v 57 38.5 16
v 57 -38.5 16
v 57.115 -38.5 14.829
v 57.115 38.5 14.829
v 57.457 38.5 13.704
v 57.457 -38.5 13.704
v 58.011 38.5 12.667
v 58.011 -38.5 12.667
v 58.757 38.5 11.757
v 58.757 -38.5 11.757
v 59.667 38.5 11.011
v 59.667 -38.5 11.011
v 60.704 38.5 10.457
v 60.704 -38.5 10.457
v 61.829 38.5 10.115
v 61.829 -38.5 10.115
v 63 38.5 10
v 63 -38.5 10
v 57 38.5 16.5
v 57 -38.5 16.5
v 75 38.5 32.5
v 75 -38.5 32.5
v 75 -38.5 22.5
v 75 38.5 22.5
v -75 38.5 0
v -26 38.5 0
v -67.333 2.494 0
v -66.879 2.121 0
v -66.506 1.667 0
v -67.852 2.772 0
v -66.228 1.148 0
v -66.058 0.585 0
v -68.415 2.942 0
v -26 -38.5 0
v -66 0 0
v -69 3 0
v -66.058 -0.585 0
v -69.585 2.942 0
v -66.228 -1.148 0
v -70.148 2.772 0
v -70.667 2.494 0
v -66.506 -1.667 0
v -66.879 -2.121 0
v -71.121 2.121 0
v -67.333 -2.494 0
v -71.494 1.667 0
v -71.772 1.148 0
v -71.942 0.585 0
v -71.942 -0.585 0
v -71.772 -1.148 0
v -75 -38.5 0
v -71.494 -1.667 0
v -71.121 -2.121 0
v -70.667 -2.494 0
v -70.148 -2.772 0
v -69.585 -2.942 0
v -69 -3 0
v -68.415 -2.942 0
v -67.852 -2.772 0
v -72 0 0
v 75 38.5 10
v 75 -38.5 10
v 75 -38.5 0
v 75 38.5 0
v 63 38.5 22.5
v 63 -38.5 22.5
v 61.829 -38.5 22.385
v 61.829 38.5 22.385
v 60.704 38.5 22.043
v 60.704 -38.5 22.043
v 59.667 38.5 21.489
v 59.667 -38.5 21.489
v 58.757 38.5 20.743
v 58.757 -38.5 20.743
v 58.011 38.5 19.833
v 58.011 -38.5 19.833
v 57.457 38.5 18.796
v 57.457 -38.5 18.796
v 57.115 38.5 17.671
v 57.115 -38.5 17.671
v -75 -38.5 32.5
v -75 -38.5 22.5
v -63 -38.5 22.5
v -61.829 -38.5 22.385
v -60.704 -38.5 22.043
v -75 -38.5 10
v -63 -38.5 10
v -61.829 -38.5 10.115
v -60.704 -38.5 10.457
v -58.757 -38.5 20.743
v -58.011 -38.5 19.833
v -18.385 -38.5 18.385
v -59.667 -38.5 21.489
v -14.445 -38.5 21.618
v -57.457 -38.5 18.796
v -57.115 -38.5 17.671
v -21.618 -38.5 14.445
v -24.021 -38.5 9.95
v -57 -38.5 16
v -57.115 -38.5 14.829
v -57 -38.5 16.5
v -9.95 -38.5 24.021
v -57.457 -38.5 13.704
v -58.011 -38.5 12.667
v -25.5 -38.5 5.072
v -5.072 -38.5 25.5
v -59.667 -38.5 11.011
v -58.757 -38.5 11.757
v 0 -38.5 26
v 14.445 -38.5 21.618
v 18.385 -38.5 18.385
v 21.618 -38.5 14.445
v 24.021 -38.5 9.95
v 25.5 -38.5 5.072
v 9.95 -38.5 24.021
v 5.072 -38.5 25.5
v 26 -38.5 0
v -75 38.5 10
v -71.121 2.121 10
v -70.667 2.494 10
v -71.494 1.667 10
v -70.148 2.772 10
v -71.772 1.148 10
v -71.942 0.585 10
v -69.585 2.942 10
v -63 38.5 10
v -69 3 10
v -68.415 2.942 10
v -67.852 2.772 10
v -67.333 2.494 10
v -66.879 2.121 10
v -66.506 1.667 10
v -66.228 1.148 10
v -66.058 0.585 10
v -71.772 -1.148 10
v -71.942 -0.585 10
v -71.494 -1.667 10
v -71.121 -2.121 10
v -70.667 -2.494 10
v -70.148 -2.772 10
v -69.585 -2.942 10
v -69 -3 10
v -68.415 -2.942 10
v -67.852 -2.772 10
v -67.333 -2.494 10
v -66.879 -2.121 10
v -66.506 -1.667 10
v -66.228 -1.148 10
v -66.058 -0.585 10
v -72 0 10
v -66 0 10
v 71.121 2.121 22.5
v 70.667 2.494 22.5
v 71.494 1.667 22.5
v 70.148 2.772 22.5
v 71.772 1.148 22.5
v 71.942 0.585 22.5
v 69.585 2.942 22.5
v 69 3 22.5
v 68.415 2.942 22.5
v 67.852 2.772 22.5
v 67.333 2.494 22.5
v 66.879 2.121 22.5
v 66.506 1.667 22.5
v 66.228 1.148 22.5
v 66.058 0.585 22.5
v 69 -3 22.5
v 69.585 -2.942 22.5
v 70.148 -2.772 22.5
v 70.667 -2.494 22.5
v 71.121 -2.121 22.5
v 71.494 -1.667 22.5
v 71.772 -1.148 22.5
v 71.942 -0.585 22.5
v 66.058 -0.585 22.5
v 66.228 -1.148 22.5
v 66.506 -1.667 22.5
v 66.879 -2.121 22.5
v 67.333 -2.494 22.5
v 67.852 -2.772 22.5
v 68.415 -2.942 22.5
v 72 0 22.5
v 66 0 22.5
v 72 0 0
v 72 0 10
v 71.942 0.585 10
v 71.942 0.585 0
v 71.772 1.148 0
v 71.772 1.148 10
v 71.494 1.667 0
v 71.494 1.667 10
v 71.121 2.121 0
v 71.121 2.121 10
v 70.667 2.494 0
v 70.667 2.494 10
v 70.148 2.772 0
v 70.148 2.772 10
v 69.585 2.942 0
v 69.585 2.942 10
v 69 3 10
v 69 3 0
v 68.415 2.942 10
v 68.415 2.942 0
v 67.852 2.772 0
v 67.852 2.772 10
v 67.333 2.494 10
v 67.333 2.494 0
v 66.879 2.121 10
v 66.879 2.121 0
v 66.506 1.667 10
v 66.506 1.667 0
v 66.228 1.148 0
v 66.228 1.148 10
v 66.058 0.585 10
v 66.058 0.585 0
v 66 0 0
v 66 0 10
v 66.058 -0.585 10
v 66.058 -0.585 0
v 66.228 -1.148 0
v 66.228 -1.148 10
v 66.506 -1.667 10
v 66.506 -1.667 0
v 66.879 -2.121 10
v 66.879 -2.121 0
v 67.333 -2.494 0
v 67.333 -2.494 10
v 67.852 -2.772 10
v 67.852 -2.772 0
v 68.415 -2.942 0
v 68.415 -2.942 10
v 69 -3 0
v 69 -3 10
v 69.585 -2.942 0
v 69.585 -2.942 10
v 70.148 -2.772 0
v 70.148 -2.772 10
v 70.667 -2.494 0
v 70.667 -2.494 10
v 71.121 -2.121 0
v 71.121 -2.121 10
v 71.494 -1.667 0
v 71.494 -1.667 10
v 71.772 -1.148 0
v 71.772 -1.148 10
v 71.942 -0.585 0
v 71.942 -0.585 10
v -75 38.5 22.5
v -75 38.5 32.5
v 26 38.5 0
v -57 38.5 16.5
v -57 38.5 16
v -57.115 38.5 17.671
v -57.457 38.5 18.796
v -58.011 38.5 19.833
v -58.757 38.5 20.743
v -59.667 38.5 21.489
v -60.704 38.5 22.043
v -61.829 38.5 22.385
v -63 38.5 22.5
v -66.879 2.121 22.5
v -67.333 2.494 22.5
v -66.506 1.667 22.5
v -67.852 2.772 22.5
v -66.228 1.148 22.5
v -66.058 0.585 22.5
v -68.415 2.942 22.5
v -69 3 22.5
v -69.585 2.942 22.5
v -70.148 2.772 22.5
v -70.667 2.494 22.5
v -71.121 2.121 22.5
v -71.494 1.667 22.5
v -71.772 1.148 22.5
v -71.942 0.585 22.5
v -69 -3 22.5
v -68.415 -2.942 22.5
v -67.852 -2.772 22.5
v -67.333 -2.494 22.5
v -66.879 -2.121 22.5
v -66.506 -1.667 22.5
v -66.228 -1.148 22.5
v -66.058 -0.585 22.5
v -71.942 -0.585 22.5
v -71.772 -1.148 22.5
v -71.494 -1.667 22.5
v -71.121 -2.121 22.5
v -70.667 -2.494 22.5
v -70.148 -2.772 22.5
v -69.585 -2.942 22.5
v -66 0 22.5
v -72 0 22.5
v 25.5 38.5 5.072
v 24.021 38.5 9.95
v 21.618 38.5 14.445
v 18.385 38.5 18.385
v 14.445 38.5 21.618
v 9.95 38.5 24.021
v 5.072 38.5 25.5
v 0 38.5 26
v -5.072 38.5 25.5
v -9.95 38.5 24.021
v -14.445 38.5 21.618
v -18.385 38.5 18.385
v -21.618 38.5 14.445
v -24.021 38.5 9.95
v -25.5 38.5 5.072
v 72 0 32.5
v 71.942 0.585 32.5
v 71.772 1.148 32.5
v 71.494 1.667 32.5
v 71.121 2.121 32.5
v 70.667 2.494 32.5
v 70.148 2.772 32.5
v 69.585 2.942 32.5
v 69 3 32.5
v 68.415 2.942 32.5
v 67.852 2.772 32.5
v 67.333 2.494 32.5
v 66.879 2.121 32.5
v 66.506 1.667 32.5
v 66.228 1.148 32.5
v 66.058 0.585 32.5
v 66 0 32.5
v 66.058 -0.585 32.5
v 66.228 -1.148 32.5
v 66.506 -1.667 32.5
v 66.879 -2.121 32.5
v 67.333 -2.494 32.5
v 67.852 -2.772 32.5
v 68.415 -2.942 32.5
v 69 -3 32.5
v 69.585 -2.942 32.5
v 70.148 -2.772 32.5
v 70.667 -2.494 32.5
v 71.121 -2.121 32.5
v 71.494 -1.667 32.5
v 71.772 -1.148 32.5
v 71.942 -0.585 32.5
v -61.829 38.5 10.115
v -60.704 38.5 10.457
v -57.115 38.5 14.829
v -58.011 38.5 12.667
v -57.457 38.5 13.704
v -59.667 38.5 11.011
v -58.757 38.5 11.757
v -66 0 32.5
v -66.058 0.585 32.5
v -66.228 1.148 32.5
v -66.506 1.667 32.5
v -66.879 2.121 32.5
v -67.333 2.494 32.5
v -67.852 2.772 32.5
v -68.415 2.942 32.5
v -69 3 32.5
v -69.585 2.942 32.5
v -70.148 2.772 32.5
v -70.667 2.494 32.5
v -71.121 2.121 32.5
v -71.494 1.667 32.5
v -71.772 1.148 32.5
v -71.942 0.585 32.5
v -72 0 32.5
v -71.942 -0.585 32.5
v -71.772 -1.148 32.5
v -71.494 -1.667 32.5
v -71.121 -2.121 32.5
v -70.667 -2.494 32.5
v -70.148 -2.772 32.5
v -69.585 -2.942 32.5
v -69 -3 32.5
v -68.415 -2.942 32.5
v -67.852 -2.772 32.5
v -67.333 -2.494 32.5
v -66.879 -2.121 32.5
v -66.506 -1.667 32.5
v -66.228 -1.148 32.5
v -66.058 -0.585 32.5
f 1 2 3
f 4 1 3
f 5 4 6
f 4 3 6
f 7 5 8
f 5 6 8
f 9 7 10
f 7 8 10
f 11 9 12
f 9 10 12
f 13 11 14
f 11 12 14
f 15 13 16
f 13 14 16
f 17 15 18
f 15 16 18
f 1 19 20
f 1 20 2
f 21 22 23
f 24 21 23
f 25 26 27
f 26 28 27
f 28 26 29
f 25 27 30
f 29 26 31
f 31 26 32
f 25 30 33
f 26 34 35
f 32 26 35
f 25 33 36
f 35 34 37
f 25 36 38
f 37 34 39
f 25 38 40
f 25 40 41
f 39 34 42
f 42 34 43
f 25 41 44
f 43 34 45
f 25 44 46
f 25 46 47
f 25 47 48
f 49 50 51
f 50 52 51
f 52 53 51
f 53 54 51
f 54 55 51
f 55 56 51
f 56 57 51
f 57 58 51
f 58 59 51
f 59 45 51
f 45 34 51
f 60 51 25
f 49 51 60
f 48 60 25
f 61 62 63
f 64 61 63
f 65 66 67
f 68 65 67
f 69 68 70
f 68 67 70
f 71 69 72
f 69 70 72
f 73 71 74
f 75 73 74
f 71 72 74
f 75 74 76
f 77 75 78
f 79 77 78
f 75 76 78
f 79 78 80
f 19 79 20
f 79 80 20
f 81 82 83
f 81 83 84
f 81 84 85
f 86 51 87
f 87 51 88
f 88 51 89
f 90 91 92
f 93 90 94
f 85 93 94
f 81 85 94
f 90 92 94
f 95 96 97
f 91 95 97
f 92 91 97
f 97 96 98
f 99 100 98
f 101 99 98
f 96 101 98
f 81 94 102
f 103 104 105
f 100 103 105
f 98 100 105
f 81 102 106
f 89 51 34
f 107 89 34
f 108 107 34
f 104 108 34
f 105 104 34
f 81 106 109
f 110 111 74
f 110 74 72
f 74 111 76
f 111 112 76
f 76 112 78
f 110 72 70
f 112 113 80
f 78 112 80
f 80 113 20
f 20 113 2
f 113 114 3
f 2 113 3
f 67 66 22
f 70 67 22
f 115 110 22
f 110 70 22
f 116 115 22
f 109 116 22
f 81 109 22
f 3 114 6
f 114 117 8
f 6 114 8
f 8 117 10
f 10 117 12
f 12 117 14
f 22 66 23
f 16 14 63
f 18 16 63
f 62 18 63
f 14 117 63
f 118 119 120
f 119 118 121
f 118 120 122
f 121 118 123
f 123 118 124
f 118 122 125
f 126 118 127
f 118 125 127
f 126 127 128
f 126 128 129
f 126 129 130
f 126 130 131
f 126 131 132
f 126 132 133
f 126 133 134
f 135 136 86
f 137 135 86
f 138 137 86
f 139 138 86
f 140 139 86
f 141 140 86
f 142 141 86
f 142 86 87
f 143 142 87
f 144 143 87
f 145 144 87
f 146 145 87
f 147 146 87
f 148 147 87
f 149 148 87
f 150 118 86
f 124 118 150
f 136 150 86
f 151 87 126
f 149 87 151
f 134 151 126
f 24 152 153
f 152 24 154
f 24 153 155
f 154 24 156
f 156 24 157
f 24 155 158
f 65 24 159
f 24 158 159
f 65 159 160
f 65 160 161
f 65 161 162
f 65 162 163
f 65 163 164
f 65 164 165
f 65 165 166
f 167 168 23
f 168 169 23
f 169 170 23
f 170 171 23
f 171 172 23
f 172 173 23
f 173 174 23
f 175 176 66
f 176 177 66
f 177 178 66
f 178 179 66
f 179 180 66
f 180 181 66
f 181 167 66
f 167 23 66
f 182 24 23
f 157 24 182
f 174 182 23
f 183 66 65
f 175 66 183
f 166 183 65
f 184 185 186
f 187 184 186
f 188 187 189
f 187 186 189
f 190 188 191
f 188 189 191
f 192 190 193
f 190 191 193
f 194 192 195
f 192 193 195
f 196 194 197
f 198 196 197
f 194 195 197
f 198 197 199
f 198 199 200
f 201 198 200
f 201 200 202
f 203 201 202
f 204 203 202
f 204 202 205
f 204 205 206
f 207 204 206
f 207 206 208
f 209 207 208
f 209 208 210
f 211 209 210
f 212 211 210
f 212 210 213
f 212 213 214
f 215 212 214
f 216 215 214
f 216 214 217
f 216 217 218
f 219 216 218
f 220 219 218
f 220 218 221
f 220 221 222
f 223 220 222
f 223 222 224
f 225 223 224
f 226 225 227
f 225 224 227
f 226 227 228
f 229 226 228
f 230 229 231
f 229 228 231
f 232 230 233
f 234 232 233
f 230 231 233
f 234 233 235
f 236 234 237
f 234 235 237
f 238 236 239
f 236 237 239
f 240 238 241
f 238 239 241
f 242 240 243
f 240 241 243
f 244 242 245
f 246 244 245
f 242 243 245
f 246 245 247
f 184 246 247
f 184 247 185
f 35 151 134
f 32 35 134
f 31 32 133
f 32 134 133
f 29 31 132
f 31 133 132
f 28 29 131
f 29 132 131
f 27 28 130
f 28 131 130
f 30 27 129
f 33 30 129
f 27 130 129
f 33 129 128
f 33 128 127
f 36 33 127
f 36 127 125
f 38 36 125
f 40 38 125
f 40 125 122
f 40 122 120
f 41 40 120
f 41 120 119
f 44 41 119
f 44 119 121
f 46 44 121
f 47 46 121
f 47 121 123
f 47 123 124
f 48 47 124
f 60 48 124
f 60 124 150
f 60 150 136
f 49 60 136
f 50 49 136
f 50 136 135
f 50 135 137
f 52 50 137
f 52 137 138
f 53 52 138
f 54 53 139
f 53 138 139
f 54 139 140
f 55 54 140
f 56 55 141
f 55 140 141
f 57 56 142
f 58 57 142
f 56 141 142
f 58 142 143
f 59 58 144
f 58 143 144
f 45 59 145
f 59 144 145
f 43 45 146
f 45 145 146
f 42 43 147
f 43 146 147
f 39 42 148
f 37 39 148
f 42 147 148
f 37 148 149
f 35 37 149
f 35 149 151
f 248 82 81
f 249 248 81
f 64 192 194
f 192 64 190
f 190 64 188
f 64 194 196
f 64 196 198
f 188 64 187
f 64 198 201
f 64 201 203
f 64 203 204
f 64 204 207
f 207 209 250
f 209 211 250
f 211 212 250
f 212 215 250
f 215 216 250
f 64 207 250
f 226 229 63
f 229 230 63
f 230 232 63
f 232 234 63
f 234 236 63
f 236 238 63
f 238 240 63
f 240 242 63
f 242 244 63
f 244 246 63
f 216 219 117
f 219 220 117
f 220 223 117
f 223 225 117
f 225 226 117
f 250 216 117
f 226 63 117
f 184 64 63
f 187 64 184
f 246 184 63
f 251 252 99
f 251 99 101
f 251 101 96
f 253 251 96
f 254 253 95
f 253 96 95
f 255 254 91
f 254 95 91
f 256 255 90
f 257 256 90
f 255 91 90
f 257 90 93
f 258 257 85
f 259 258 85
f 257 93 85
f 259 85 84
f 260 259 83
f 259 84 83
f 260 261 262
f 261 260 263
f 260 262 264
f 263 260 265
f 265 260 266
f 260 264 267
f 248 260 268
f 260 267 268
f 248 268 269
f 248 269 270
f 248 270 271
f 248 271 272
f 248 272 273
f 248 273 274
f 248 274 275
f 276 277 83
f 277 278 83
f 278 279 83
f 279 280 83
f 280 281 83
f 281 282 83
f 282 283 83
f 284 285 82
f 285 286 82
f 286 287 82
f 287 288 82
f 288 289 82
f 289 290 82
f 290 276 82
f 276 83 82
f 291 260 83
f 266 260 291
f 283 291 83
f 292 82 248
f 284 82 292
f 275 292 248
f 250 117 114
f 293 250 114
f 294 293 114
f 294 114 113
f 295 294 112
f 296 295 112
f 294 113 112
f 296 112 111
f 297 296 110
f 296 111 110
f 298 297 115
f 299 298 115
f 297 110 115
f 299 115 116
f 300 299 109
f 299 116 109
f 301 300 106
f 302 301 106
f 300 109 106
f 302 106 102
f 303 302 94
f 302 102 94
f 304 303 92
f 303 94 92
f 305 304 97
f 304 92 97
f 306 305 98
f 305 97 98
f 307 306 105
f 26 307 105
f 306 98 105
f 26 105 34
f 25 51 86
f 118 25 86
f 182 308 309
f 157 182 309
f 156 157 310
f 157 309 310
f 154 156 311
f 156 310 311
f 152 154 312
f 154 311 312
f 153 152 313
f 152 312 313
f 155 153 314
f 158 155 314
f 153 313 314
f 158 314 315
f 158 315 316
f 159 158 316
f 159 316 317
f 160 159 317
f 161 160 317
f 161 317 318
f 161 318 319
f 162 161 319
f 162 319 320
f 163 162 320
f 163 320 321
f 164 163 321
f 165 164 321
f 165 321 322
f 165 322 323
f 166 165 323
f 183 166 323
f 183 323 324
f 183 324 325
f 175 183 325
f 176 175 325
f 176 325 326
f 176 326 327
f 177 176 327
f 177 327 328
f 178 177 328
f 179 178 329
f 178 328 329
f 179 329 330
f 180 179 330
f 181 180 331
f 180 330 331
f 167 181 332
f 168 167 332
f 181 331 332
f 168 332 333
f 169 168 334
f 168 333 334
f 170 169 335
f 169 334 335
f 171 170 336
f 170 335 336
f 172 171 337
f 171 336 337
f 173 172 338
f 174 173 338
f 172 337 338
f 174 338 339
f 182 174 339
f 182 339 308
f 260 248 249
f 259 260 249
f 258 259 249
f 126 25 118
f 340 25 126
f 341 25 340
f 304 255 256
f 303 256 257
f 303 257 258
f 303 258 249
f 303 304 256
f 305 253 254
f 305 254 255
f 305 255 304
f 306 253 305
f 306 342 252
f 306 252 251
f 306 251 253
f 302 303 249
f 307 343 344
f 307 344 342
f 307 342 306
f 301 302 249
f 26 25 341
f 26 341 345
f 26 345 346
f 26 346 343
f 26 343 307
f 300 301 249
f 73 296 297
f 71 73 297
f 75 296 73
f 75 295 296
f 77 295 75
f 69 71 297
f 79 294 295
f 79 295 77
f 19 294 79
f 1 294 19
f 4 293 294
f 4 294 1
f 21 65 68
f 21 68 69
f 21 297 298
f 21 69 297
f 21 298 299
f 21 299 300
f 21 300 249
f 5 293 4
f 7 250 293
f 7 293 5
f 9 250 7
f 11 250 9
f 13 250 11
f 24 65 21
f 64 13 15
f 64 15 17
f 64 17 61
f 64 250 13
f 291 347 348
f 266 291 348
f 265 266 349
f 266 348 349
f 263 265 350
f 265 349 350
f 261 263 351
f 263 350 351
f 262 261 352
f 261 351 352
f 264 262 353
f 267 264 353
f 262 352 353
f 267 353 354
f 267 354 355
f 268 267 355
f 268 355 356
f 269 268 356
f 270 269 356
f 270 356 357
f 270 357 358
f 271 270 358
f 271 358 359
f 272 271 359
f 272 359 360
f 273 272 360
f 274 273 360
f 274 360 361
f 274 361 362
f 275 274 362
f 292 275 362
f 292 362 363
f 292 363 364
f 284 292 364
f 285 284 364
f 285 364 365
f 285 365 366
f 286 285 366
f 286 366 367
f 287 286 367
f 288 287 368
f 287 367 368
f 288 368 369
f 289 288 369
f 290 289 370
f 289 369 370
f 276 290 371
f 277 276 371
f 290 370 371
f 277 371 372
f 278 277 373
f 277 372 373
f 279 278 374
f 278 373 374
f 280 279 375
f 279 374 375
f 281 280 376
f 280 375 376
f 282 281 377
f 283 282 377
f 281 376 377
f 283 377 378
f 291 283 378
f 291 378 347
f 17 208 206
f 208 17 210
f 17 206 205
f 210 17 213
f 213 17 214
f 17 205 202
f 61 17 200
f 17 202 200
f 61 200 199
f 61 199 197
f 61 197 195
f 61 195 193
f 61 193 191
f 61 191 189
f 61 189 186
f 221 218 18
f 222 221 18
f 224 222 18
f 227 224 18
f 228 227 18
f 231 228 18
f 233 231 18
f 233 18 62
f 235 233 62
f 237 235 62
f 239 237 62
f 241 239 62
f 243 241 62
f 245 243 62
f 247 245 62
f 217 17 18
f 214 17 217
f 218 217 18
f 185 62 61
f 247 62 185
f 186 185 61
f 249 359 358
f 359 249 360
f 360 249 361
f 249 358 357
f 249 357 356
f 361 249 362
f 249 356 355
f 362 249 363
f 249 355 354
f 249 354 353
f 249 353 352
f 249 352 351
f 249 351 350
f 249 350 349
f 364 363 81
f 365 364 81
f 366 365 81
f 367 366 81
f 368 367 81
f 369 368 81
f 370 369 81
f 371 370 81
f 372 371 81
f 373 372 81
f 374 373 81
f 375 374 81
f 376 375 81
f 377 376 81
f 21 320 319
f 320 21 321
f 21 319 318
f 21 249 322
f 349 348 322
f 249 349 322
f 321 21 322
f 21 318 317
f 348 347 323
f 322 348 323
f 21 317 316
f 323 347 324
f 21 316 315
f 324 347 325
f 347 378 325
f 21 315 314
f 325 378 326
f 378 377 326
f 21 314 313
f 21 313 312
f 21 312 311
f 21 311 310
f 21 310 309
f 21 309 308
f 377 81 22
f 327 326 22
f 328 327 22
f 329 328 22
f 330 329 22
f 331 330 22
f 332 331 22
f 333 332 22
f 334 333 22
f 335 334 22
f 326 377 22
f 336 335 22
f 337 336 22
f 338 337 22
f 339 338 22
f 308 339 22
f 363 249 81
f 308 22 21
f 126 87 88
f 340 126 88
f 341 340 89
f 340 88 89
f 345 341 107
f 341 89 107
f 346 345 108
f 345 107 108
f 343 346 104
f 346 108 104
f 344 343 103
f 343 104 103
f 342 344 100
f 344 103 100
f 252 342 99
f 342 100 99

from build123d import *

# Parameters (mm, degrees)
BOSS_EXTRUDE1_DEPTH      = 38.5
BOSS_EXTRUDE1_DEPTH_BACK = 38.5
SKETCH5_R                = 3
CUT_EXTRUDE1_DEPTH       = 91.352089074


with BuildPart() as part:
    # Sketch1 → Boss-Extrude1 (new, two sides: drawn at the far end of the back side and taken through both)
    with BuildSketch(Plane(origin=(0, 0, 0), x_dir=(1, 0, 0), z_dir=(0, 1, 0)).offset(-BOSS_EXTRUDE1_DEPTH_BACK)):
        with BuildLine():
            Line((-26, 0), (-75, 0))
            Line((-75, 0), (-75, -10))
            Line((-75, -10), (-63, -10))
            ThreePointArc((-63, -10), (-58.757359313, -11.757359313), (-57, -16))
            Line((-57, -16), (-57, -16.5))
            ThreePointArc((-57, -16.5), (-58.757359313, -20.742640687), (-63, -22.5))
            Line((-63, -22.5), (-75, -22.5))
            Line((-75, -22.5), (-75, -32.5))
            Line((-75, -32.5), (75, -32.5))
            Line((75, -32.5), (75, -22.5))
            Line((75, -22.5), (63, -22.5))
            ThreePointArc((63, -22.5), (58.757359313, -20.742640687), (57, -16.5))
            Line((57, -16.5), (57, -16))
            ThreePointArc((57, -16), (58.757359313, -11.757359313), (63, -10))
            Line((63, -10), (75, -10))
            Line((75, -10), (75, 0))
            Line((75, 0), (26, 0))
            ThreePointArc((26, 0), (0, -26), (-26, 0))
        make_face()
    extrude(amount=BOSS_EXTRUDE1_DEPTH + BOSS_EXTRUDE1_DEPTH_BACK)

    # Sketch5 → Cut-Extrude1 (cut, through all)
    with BuildSketch(Plane.XY.offset(32.5)):
        with Locations((-69, 0)):
            Circle(SKETCH5_R)
        with Locations((69, 0)):
            Circle(SKETCH5_R)
    extrude(amount=-CUT_EXTRUDE1_DEPTH, mode=Mode.SUBTRACT)


solid = part.part
